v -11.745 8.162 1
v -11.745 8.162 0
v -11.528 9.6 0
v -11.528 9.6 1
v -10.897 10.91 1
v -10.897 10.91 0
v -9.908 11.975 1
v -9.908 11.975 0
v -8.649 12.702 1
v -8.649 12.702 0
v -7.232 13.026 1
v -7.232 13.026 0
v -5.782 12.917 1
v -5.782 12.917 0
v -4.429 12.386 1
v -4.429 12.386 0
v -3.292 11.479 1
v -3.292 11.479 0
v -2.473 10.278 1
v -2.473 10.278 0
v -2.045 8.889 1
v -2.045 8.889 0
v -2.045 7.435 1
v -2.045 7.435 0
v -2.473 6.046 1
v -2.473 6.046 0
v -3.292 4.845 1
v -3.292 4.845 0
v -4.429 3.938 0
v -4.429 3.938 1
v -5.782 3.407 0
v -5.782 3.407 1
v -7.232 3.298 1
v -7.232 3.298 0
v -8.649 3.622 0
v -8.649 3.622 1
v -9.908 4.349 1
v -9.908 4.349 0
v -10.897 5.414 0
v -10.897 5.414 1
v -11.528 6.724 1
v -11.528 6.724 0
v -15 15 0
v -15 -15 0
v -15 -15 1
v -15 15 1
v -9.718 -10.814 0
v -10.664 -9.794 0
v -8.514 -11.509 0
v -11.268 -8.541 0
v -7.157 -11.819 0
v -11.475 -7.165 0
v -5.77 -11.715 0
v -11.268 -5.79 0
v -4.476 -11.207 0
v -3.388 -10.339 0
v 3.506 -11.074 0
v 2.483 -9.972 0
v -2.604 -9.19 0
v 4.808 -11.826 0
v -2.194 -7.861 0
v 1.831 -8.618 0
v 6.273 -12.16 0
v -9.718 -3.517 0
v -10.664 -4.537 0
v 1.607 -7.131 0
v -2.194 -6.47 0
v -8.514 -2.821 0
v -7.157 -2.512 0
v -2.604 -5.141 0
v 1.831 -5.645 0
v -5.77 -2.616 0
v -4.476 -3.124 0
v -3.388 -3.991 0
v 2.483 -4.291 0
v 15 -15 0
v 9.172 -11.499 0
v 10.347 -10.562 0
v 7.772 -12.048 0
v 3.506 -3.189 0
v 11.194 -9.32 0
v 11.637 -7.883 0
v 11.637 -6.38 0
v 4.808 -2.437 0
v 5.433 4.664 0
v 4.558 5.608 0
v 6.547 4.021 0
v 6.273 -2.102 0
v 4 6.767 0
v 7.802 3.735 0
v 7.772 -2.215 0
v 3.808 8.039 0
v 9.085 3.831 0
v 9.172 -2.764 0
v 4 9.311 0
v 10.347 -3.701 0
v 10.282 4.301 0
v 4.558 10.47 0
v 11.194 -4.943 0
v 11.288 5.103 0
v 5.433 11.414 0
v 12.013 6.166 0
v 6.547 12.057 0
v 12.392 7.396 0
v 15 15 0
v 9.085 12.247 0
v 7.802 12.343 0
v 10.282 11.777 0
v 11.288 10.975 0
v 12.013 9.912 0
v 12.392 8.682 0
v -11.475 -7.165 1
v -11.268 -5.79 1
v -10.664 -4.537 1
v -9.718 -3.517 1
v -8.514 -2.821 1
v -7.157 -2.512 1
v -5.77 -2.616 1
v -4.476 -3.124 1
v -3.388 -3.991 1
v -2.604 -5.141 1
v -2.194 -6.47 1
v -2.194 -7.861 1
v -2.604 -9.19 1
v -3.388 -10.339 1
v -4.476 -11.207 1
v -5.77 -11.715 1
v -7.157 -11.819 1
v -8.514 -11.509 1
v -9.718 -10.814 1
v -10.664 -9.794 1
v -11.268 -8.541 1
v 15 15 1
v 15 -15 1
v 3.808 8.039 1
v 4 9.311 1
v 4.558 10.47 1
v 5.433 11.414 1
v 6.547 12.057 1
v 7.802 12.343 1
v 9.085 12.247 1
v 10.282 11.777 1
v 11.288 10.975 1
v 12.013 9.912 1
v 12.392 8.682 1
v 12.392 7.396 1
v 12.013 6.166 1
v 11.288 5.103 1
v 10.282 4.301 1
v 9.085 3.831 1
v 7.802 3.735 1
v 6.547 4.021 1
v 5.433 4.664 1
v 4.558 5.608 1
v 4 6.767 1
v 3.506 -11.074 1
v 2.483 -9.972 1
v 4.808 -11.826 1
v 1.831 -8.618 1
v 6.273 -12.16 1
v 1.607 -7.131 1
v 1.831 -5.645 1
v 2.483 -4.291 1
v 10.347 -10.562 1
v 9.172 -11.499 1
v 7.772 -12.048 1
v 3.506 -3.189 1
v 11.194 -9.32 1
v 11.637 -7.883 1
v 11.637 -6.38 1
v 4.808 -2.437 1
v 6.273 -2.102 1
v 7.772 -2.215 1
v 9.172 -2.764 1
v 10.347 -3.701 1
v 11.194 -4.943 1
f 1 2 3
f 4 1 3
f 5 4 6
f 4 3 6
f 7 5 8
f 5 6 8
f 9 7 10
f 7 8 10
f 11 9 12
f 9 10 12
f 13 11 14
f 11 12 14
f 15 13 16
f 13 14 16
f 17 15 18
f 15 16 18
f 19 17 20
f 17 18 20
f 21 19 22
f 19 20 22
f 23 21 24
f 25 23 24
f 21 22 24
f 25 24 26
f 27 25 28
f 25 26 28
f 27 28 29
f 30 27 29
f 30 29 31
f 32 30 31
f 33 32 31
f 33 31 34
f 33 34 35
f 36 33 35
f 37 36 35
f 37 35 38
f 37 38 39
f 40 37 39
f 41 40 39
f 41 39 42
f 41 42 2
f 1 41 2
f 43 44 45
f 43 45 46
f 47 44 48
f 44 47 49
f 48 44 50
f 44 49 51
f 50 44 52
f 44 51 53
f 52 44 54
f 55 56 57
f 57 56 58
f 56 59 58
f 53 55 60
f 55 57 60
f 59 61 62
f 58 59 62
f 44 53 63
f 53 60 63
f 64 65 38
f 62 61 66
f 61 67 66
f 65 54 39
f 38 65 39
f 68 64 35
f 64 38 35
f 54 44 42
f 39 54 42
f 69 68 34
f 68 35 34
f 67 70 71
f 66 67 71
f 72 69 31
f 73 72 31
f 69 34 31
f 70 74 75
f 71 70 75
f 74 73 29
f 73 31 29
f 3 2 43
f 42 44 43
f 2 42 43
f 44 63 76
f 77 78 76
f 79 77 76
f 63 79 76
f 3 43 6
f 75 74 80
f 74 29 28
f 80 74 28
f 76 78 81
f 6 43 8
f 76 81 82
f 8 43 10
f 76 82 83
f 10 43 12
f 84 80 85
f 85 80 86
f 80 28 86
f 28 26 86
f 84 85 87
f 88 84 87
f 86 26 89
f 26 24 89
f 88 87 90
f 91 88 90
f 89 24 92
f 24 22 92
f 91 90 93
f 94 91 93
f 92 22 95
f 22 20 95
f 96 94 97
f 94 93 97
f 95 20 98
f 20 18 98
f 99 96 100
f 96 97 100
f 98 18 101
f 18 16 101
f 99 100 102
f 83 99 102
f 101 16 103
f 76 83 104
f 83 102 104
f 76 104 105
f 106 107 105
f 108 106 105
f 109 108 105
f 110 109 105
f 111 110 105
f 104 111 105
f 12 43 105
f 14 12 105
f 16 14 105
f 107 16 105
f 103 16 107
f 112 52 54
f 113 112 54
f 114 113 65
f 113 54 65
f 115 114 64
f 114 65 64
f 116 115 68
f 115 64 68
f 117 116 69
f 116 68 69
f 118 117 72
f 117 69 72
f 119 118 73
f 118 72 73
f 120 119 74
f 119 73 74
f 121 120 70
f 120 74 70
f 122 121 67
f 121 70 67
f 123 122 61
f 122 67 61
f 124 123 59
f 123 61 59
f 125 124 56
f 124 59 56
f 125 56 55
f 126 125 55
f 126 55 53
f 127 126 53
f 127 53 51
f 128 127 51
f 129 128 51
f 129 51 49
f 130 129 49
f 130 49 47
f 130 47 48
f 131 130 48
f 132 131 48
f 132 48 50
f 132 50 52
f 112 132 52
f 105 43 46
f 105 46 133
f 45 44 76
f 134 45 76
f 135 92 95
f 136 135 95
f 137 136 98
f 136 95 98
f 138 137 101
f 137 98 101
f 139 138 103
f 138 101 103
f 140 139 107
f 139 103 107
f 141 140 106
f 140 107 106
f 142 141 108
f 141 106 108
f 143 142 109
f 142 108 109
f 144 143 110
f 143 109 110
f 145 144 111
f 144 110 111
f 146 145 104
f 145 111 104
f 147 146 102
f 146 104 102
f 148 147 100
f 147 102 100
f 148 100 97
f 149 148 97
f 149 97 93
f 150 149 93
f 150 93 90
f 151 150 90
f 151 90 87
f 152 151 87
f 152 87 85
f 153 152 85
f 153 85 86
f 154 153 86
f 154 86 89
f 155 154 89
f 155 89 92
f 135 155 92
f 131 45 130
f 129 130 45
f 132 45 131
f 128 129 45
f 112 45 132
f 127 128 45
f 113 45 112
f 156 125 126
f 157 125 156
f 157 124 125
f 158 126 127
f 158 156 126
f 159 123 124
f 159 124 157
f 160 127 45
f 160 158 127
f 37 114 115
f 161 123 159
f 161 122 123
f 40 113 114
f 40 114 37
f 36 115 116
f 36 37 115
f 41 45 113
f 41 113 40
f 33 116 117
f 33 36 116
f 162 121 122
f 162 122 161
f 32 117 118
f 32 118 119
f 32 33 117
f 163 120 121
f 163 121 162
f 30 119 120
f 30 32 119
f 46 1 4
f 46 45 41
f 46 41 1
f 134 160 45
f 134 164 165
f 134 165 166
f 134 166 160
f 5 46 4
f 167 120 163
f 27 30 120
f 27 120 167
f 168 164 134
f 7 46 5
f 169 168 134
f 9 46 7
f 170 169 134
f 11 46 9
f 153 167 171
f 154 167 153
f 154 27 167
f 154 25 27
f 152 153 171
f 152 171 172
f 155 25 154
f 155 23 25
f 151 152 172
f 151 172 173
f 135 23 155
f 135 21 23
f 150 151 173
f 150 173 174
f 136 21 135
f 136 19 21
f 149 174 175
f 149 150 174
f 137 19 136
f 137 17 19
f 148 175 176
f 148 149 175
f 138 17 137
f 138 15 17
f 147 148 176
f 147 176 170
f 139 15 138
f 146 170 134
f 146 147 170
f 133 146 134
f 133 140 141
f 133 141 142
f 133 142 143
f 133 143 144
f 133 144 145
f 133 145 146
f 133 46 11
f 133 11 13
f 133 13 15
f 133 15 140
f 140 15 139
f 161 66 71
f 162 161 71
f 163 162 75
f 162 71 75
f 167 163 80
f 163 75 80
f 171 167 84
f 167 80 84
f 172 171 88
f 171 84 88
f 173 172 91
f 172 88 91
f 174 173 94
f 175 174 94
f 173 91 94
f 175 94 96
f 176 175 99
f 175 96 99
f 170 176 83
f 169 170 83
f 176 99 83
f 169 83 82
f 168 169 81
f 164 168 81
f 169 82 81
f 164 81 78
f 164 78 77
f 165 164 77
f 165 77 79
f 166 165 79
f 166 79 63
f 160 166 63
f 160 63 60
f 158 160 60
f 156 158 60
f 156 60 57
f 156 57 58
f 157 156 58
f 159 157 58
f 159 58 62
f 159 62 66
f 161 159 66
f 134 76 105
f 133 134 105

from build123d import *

# Parameters (mm, degrees)
SKETCH1_W           = 30
SKETCH1_H           = 30
BOSS_EXTRUDE1_DEPTH = 1
SKETCH2_R           = 4.316163829
CUT_EXTRUDE1_DEPTH  = 3
SKETCH3_R           = 5.043132961
CUT_EXTRUDE2_DEPTH  = 3
SKETCH4_R           = 4.877423457
CUT_EXTRUDE3_DEPTH  = 3
SKETCH5_R           = 4.666431363
CUT_EXTRUDE4_DEPTH  = 3


with BuildPart() as part:
    # Sketch1 → Boss-Extrude1 (new body)
    with BuildSketch(Plane.XY):
        Rectangle(SKETCH1_W, SKETCH1_H)
    extrude(amount=BOSS_EXTRUDE1_DEPTH)

    # Sketch2 → Cut-Extrude1 (cut)
    with BuildSketch(Plane(origin=(0, 0, 0), x_dir=(-1, 0, 0), z_dir=(0, 0, -1))):
        with Locations((-8.12429837, 8.038997658)):
            Circle(SKETCH2_R)
    extrude(amount=-CUT_EXTRUDE1_DEPTH, mode=Mode.SUBTRACT)

    # Sketch3 → Cut-Extrude2 (cut)
    with BuildSketch(Plane(origin=(0, 0, 0), x_dir=(-1, 0, 0), z_dir=(0, 0, -1))):
        with Locations((-6.650270789, -7.131419922)):
            Circle(SKETCH3_R)
    extrude(amount=-CUT_EXTRUDE2_DEPTH, mode=Mode.SUBTRACT)

    # Sketch4 → Cut-Extrude3 (cut)
    with BuildSketch(Plane(origin=(0, 0, 0), x_dir=(-1, 0, 0), z_dir=(0, 0, -1))):
        with Locations((6.8674749, 8.16200162)):
            Circle(SKETCH4_R)
    extrude(amount=-CUT_EXTRUDE3_DEPTH, mode=Mode.SUBTRACT)

    # Sketch5 → Cut-Extrude4 (cut)
    with BuildSketch(Plane(origin=(0, 0, 0), x_dir=(-1, 0, 0), z_dir=(0, 0, -1))):
        with Locations((6.808728507, -7.165302377)):
            Circle(SKETCH5_R)
    extrude(amount=-CUT_EXTRUDE4_DEPTH, mode=Mode.SUBTRACT)


solid = part.part
